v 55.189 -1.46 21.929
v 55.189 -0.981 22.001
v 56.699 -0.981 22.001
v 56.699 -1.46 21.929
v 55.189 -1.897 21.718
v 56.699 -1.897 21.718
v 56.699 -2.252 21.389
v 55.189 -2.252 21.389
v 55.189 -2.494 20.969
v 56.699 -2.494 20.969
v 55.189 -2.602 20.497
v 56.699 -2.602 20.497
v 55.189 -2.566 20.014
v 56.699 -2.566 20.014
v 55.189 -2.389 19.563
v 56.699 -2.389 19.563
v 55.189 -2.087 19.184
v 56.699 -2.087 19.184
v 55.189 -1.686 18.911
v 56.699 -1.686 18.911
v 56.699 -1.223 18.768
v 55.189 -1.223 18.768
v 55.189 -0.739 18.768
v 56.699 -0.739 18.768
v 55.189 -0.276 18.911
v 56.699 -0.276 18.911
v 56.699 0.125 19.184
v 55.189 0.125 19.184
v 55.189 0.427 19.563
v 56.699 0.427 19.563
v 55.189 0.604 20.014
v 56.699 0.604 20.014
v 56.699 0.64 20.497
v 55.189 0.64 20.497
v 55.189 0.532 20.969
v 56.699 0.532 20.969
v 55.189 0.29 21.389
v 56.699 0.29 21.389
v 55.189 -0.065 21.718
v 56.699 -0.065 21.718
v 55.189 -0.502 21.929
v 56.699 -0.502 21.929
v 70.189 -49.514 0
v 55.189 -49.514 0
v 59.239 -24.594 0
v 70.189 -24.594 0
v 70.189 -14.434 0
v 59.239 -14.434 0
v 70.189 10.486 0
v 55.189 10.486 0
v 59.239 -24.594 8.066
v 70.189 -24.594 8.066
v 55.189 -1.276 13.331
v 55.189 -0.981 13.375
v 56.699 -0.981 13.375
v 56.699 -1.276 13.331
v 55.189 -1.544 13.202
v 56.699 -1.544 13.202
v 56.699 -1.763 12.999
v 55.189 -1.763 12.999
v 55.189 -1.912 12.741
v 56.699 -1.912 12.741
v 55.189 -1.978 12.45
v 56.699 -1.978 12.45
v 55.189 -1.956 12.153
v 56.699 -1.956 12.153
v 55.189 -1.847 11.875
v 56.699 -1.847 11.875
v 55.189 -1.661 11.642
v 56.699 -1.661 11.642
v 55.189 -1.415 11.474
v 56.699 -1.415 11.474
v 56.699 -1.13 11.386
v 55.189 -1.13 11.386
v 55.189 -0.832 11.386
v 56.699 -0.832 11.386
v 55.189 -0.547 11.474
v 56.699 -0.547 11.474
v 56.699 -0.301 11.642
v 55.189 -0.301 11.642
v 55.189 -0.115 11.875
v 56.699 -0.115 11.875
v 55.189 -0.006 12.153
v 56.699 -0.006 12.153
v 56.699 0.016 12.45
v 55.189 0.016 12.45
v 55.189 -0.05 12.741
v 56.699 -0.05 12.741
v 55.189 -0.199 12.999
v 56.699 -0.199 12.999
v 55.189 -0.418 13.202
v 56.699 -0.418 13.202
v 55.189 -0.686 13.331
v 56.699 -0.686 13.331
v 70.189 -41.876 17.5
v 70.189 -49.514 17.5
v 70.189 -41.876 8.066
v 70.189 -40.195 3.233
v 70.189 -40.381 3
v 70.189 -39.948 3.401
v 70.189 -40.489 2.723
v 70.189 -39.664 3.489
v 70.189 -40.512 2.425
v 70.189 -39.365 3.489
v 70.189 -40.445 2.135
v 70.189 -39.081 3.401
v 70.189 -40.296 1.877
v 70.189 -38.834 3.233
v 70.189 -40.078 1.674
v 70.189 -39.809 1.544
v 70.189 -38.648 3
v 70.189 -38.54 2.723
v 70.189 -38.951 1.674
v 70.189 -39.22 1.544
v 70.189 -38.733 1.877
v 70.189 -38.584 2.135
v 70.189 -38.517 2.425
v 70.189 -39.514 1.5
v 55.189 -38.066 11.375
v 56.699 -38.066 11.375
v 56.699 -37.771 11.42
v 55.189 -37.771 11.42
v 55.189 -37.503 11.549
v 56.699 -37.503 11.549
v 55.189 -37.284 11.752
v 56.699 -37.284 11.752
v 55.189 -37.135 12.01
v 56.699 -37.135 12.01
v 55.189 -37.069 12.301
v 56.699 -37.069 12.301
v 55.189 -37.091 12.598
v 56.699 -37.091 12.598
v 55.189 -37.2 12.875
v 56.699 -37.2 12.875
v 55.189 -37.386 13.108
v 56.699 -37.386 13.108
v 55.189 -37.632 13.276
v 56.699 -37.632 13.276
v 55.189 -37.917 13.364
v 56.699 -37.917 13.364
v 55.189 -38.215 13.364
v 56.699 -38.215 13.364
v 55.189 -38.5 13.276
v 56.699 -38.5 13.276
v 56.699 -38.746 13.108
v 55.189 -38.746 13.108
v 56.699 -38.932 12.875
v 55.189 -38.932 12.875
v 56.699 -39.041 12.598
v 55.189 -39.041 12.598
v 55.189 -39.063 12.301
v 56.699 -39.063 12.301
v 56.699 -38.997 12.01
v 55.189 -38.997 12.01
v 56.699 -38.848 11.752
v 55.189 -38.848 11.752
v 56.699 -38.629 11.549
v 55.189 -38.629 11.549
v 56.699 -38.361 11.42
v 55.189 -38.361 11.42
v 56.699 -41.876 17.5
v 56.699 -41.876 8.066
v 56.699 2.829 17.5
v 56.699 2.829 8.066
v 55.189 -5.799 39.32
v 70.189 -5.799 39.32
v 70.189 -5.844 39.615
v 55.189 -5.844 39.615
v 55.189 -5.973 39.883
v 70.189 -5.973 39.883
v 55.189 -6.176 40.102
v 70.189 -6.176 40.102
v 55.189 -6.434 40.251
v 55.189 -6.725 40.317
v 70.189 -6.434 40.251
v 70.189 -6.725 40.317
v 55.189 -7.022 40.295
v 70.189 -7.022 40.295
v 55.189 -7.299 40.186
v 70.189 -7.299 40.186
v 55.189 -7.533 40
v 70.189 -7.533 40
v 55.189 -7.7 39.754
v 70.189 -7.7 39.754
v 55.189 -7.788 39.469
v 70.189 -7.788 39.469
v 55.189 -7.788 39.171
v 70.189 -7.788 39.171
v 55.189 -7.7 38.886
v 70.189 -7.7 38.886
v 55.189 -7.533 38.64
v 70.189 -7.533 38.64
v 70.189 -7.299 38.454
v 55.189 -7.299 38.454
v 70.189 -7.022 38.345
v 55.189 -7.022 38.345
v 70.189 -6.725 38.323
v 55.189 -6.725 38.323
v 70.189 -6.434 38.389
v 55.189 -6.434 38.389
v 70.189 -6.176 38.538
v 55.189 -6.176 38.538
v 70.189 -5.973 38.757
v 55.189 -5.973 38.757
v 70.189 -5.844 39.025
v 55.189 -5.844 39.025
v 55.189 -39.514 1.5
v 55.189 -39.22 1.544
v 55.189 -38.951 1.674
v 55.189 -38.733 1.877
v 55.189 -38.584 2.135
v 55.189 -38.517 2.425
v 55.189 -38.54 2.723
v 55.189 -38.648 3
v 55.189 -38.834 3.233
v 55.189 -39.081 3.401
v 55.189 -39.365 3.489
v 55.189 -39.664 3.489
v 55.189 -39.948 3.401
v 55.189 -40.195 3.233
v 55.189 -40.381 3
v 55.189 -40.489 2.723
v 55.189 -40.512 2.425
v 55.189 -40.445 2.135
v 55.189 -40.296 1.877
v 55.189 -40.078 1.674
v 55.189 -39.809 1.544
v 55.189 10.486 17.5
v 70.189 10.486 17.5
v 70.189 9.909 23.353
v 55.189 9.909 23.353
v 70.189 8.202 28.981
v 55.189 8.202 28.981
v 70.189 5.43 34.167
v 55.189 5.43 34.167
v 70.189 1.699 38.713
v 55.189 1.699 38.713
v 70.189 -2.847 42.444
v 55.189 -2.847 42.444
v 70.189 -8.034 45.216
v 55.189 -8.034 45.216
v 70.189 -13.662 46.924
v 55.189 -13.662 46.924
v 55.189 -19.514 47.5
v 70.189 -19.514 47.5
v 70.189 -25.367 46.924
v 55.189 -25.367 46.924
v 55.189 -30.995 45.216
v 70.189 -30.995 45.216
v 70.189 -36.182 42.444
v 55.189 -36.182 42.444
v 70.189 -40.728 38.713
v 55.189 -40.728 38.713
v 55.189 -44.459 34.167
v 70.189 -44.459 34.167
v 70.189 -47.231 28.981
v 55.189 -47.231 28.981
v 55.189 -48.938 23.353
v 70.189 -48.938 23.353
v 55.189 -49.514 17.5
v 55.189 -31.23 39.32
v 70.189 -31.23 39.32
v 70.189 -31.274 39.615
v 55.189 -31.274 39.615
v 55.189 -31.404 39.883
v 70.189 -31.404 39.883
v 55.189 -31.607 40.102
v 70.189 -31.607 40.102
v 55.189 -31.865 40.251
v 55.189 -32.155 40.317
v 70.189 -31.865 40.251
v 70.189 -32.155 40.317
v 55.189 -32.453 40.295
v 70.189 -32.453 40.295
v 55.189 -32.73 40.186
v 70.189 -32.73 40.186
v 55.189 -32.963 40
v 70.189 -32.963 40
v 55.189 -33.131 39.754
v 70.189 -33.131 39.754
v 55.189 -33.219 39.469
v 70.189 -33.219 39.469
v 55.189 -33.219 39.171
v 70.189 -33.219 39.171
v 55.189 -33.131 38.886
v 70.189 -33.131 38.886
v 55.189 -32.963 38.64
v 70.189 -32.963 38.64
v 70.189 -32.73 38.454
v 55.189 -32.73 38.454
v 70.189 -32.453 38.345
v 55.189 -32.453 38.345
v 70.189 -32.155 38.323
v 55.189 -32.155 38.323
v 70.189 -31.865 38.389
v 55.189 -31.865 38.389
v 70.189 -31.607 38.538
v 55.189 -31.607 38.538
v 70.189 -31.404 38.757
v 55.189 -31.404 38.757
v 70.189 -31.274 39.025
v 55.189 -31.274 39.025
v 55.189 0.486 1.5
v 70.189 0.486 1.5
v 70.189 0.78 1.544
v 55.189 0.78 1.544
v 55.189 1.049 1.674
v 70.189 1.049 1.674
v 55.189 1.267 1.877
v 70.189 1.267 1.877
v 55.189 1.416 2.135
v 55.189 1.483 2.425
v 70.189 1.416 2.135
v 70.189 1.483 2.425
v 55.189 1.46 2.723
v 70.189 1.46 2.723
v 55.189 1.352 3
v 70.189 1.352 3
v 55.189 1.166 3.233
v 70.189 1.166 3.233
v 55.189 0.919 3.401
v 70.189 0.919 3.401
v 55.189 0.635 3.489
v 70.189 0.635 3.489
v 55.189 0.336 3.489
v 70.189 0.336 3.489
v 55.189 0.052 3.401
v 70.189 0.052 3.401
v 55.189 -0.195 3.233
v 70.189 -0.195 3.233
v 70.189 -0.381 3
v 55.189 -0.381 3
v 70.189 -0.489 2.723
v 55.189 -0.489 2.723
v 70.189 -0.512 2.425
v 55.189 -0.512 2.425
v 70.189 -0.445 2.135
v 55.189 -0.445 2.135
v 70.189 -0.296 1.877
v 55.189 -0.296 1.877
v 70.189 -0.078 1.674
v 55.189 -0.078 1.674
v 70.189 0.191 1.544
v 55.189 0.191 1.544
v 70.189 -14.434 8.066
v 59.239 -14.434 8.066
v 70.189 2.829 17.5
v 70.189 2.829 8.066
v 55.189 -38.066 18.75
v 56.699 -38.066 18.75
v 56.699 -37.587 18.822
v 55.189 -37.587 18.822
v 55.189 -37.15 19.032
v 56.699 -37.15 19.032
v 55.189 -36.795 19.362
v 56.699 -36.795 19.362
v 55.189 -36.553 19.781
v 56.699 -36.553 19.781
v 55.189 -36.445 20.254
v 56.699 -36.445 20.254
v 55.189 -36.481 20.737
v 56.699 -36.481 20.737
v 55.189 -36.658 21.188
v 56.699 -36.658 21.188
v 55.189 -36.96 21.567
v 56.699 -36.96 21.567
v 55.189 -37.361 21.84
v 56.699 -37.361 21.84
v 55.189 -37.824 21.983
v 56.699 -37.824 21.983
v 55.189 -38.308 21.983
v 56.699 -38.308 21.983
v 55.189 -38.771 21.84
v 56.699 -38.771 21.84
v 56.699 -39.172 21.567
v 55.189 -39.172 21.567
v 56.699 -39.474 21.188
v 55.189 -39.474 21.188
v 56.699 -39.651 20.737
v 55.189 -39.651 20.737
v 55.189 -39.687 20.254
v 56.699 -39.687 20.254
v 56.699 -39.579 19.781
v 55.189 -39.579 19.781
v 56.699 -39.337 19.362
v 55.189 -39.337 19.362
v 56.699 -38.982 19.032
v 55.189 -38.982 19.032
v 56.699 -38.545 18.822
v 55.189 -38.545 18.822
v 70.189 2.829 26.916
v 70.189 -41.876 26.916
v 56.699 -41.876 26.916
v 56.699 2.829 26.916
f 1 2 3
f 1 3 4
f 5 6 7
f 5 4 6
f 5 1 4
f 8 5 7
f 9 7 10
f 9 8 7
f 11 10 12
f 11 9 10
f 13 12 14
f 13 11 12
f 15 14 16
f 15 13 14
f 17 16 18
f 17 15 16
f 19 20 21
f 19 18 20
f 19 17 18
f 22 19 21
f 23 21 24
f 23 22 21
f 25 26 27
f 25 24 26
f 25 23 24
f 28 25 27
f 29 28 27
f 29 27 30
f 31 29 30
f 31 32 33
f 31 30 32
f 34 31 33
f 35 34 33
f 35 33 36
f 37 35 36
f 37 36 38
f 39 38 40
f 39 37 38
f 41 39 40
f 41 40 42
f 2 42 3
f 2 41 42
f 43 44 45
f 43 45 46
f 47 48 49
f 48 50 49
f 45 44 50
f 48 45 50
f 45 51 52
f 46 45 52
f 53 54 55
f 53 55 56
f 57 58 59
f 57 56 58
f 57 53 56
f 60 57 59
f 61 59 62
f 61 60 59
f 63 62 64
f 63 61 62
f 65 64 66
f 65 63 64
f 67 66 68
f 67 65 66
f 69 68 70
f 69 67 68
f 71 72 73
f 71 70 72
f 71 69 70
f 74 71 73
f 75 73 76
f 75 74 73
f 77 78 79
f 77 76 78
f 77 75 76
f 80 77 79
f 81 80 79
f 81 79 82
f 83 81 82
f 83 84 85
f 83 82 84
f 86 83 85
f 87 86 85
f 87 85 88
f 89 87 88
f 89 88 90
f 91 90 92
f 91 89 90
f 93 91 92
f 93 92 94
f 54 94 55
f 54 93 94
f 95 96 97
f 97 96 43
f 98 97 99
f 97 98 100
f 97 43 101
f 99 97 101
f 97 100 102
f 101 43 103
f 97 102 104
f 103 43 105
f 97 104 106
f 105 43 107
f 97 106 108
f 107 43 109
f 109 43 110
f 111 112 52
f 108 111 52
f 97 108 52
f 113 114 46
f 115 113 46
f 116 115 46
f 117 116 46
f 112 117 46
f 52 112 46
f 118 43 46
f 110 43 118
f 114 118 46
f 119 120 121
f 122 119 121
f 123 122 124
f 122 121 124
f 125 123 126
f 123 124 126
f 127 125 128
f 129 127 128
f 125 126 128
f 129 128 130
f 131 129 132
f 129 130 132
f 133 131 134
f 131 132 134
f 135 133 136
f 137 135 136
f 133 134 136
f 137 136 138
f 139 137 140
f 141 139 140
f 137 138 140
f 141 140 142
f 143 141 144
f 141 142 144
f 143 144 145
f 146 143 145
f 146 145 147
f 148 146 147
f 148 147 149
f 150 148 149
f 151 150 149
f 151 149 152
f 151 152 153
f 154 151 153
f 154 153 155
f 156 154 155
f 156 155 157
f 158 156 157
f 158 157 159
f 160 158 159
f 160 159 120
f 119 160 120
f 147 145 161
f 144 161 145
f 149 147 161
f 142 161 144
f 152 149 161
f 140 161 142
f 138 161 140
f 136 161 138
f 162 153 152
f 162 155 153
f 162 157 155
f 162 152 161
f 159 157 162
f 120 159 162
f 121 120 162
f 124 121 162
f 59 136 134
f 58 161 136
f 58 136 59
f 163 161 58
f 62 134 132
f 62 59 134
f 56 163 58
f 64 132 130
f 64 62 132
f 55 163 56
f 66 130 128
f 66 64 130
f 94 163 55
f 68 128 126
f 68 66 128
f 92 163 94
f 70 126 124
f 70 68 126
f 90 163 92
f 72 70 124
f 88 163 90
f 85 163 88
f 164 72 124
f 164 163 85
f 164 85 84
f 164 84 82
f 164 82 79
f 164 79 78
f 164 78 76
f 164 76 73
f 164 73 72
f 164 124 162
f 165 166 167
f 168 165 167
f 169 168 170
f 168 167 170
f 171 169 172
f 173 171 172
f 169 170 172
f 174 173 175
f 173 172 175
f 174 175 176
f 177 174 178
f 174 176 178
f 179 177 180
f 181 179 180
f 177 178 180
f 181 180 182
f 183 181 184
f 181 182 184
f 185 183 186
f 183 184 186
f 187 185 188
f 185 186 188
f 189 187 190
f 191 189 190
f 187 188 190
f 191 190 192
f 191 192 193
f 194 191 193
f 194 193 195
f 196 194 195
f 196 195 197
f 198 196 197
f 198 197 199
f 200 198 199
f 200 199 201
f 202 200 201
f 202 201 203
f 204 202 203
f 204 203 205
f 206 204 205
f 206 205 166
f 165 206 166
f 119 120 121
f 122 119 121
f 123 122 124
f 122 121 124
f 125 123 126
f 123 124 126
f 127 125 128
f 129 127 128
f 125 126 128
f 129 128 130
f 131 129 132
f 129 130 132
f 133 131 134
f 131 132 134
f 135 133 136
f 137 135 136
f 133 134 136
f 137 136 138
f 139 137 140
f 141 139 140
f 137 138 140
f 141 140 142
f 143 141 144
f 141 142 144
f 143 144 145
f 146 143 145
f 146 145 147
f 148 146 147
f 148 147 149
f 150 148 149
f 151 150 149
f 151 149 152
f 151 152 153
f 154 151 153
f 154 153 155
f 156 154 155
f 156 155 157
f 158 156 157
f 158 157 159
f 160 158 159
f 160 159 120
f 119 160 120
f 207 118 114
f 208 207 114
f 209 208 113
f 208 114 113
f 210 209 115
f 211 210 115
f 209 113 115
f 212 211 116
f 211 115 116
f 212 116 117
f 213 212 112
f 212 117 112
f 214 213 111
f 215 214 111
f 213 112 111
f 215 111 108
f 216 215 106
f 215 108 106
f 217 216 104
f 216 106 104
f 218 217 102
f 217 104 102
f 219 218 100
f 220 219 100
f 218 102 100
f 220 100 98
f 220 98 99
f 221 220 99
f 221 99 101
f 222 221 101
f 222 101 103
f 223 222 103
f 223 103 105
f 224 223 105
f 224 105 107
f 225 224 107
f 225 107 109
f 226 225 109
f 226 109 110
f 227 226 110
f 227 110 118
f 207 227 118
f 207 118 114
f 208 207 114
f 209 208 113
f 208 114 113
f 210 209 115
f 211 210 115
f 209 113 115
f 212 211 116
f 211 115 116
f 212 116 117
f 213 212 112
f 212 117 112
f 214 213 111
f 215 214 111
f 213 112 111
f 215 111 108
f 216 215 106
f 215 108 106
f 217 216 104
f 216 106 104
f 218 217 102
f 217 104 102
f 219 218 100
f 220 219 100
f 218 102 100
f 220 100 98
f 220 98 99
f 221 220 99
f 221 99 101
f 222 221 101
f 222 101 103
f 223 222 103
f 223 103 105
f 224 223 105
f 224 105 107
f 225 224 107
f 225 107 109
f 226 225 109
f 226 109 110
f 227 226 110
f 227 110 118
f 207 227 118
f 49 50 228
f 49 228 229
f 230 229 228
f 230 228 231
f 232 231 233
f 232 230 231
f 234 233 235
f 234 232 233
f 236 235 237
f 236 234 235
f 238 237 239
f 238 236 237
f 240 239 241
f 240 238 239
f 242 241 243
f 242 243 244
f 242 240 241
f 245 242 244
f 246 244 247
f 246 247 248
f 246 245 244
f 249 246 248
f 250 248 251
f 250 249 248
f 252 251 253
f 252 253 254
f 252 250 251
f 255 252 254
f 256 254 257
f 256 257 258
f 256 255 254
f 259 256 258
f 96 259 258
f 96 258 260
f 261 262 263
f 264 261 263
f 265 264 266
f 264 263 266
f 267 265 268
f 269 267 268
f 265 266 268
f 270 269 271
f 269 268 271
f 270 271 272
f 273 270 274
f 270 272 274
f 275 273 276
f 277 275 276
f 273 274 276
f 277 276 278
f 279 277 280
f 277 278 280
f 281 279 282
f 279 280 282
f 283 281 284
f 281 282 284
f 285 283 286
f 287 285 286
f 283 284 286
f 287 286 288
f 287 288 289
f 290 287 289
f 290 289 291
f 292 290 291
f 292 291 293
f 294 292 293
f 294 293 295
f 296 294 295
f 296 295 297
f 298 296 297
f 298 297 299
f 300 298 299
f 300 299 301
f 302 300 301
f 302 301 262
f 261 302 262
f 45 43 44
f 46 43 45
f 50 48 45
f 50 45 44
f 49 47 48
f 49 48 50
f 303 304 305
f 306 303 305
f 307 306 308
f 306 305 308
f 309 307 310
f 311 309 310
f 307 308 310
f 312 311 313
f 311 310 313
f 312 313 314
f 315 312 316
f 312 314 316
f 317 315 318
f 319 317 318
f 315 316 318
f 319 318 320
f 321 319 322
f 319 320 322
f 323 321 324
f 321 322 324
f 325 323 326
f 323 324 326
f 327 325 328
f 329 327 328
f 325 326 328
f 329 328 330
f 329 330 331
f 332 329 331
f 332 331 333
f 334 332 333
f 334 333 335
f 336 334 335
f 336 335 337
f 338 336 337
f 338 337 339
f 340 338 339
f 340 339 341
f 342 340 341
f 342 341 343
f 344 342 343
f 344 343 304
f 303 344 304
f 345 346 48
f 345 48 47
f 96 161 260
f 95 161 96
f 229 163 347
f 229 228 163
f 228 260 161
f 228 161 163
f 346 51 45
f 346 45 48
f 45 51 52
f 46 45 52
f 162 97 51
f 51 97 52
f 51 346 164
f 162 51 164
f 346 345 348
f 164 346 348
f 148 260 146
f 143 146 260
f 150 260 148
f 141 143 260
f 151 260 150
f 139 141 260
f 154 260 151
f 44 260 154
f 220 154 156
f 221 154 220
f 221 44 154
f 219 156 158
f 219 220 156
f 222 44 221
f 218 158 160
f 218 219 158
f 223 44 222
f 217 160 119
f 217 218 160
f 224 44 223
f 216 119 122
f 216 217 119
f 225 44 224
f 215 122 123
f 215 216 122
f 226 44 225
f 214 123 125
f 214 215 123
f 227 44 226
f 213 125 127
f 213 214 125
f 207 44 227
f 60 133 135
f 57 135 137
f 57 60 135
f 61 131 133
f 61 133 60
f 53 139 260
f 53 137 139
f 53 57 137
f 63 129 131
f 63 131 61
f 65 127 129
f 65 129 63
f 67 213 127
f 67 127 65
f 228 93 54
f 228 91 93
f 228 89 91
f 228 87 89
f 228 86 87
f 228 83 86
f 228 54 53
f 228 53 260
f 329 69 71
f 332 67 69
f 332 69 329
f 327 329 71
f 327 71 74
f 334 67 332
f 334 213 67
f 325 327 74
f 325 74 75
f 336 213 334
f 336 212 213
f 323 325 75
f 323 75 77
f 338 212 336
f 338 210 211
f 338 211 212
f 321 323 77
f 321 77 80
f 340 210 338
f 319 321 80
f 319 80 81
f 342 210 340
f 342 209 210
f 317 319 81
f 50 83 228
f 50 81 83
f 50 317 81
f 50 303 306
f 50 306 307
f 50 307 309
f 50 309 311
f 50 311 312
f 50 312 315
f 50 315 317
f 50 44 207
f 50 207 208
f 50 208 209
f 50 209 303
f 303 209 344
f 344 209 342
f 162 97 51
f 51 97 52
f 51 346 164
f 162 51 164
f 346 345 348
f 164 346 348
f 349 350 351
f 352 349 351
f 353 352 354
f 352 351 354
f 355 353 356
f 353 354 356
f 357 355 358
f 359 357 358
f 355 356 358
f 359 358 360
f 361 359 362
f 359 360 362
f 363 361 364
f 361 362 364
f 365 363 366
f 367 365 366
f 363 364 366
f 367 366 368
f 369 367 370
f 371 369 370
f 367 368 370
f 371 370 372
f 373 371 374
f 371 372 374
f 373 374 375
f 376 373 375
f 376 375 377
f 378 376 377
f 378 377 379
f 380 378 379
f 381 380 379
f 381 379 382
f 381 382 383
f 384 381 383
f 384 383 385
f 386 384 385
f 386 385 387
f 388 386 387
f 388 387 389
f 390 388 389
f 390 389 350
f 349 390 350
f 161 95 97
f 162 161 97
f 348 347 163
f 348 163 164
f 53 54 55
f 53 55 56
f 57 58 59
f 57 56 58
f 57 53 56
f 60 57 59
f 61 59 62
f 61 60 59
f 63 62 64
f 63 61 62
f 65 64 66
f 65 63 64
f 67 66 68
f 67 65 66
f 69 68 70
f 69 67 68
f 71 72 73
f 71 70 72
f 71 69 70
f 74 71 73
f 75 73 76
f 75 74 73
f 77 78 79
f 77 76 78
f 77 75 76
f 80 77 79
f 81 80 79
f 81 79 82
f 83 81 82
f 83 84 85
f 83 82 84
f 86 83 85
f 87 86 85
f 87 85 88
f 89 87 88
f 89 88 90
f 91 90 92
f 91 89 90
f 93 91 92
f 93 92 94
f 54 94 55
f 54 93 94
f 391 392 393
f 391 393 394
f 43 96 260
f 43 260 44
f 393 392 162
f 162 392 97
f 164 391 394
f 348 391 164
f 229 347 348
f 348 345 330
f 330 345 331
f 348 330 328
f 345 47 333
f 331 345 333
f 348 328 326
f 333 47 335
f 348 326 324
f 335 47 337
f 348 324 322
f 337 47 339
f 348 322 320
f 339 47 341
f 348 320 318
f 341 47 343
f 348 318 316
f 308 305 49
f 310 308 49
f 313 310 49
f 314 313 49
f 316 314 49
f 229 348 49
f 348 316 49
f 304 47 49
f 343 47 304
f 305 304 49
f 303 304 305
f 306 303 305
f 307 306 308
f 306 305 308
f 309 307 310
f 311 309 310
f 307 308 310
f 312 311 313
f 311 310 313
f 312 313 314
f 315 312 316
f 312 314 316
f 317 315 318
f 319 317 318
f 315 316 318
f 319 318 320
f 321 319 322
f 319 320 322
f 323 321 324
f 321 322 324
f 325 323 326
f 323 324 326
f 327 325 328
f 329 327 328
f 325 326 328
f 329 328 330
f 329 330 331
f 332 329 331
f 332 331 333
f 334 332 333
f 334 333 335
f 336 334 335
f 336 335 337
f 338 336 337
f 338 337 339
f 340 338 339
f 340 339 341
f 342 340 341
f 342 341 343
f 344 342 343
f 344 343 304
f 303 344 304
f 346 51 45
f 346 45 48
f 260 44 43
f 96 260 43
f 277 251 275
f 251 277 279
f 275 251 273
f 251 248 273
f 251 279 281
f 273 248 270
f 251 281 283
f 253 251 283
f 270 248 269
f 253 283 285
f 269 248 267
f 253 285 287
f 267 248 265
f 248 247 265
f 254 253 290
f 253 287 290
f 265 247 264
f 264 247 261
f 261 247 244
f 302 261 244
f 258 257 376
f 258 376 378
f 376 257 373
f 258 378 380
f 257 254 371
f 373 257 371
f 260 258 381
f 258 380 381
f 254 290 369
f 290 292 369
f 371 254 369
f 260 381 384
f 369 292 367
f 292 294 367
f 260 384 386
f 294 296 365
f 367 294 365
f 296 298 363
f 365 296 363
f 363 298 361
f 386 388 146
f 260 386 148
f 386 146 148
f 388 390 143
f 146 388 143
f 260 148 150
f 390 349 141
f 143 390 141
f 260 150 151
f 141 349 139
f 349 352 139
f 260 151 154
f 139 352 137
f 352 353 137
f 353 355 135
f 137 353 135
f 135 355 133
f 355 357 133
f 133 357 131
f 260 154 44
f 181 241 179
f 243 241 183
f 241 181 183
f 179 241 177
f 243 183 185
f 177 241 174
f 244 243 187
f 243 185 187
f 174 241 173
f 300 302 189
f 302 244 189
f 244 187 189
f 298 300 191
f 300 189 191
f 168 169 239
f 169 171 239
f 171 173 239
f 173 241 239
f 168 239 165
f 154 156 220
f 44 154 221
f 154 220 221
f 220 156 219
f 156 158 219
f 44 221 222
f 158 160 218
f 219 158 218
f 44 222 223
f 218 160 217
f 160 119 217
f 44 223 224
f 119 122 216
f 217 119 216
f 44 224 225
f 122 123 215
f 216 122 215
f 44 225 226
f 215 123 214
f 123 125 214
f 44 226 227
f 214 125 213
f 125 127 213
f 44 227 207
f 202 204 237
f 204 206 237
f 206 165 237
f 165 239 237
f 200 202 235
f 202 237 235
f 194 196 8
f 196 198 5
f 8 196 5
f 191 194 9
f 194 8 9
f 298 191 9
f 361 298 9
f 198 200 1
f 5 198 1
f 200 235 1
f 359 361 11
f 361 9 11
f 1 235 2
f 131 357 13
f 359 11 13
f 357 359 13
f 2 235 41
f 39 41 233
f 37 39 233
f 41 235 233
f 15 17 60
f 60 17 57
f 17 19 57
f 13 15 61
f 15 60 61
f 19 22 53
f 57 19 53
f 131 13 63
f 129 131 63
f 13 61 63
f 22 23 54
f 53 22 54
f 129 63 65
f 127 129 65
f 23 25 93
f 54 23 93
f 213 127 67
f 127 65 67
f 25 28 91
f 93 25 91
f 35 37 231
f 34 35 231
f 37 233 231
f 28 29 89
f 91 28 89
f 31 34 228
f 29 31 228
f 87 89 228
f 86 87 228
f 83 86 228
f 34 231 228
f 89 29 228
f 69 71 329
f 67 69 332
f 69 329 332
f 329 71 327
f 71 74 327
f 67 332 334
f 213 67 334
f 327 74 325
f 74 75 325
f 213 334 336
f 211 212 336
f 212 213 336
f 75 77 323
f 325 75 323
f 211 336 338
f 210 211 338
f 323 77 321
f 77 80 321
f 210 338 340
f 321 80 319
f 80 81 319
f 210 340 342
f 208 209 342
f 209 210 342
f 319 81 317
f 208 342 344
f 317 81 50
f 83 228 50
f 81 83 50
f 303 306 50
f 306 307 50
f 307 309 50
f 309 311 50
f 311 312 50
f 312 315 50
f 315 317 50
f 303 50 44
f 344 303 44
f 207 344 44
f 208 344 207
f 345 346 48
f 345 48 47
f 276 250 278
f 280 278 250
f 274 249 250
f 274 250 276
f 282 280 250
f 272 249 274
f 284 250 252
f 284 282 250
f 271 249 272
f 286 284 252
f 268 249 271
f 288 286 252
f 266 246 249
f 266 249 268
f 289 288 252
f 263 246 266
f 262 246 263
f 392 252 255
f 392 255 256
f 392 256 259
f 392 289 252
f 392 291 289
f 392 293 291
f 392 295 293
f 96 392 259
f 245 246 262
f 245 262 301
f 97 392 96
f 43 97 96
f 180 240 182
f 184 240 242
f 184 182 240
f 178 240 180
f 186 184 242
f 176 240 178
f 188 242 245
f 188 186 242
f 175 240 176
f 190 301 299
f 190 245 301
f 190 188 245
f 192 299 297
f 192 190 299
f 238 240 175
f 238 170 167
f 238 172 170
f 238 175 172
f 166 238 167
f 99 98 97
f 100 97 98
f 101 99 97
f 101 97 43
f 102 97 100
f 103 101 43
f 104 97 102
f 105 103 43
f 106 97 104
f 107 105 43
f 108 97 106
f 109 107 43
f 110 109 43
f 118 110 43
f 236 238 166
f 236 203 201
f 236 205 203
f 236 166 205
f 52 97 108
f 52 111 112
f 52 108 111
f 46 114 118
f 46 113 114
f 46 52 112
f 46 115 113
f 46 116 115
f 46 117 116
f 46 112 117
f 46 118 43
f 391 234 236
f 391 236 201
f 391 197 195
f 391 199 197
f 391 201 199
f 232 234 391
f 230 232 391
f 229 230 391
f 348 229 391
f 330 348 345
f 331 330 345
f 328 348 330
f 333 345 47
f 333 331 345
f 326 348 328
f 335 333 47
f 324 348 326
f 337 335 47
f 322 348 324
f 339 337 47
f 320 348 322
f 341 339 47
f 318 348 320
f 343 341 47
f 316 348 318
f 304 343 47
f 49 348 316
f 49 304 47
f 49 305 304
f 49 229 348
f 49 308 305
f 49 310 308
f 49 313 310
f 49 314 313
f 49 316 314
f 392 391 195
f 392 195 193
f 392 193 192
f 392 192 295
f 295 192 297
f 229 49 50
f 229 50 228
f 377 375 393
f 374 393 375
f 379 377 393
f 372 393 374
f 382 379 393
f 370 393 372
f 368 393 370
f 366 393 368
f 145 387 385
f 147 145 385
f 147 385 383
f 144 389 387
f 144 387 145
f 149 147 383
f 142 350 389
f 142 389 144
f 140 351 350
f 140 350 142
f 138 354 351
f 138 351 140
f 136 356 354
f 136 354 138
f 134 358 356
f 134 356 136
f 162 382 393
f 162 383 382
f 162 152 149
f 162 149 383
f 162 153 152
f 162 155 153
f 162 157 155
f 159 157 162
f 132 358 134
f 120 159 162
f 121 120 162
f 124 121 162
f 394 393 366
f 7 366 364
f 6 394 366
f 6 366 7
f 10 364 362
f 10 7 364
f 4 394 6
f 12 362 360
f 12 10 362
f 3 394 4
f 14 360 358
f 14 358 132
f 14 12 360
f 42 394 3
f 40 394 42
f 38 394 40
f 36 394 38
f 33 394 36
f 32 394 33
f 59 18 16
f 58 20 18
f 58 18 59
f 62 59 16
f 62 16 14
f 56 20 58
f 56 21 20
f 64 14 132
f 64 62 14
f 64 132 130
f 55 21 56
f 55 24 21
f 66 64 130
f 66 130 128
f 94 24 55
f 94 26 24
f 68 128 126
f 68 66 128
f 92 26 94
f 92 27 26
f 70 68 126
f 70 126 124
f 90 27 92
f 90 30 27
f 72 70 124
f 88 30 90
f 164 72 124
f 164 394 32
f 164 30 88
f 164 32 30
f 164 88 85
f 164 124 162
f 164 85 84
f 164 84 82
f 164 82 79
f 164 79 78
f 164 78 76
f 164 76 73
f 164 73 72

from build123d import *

# Parameters (mm, degrees)
RESSALTO_EXTRUS_O9_DEPTH      = 12.5
RESSALTO_EXTRUS_O9_DEPTH_BACK = 5
ESBO_O34_W                    = 15
ESBO_O34_H                    = 60
RESSALTO_EXTRUS_O10_DEPTH     = 15
ESBO_O36_R                    = 1
CORTE_EXTRUS_O18_DEPTH        = 20
ESBO_O39_W                    = 18.85
ESBO_O39_H                    = 44.705
CORTE_EXTRUS_O20_DEPTH        = 13.49
ESBO_O43_W                    = 10.95
ESBO_O43_H                    = 10.16
CORTE_EXTRUS_O23_DEPTH        = 10
CORTE_EXTRUS_O33_DEPTH        = 20
CORTE_EXTRUS_O33_DEPTH_BACK   = 10
ESBO_O41_R                    = 1.6255
ESBO_O41_R_2                  = 1
ESBO_O42_R                    = 1.6255
ESBO_O42_R_2                  = 1
CORTE_EXTRUS_O34_DEPTH        = 20
ESBO_O62_R                    = 1
CORTE_EXTRUS_O35_DEPTH        = 20


with BuildPart() as part:
    # Esboço34 → Ressalto-extrusão9 (new, two sides: drawn at the far end of the back side and taken through both)
    with BuildSketch(Plane.XY.offset(5).offset(-RESSALTO_EXTRUS_O9_DEPTH_BACK)):
        with Locations((62.689074272, -19.514497041)):
            Rectangle(ESBO_O34_W, ESBO_O34_H)
    extrude(amount=RESSALTO_EXTRUS_O9_DEPTH + RESSALTO_EXTRUS_O9_DEPTH_BACK)


with BuildPart() as body_2:
    # Esboço35 → Ressalto-extrusão10 (new body)
    with BuildSketch(Plane(origin=(70.189074272, 0, 0), x_dir=(0, 0, -1), z_dir=(1, 0, 0))):
        with BuildLine():
            Line((0, 10.485502959), (-17.5, 10.485502959))
            ThreePointArc((-17.5, 10.485502959), (-47.5, -19.514497041), (-17.5, -49.514497041))
            Line((-17.5, -49.514497041), (0, -49.514497041))
            Line((0, -49.514497041), (0, 10.485502959))
        make_face()
    extrude(amount=-RESSALTO_EXTRUS_O10_DEPTH)


with BuildPart() as corte_extrus_o18_tool:
    # Esboço36 → Corte-extrusão18 (new body)
    with BuildSketch(Plane(origin=(70.189074272, 0, 0), x_dir=(0, 0, -1), z_dir=(1, 0, 0))):
        with Locations((-2.5, -39.514497041)):
            Circle(ESBO_O36_R)
        with Locations((-2.5, 0.485502959)):
            Circle(ESBO_O36_R)
    extrude(amount=-CORTE_EXTRUS_O18_DEPTH)


with BuildPart() as part_1:
    add(part.part)

    # Corte-extrusão18: cut by corte_extrus_o18_tool
    add(corte_extrus_o18_tool.part, mode=Mode.SUBTRACT)


with BuildPart() as body_2_1:
    add(body_2.part)

    # Corte-extrusão18: cut by corte_extrus_o18_tool
    add(corte_extrus_o18_tool.part, mode=Mode.SUBTRACT)


with BuildPart() as corte_extrus_o20_tool:
    # Esboço39 → Corte-extrusão20 (new body)
    with BuildSketch(Plane(origin=(70.189074272, 0, 0), x_dir=(0, 0, -1), z_dir=(1, 0, 0))):
        with Locations((-17.491326567, -19.523544175)):
            Rectangle(ESBO_O39_W, ESBO_O39_H)
    extrude(amount=-CORTE_EXTRUS_O20_DEPTH)


with BuildPart() as part_2:
    add(part_1.part)

    # Corte-extrusão20: cut by corte_extrus_o20_tool
    add(corte_extrus_o20_tool.part, mode=Mode.SUBTRACT)


with BuildPart() as body_2_2:
    add(body_2_1.part)

    # Corte-extrusão20: cut by corte_extrus_o20_tool
    add(corte_extrus_o20_tool.part, mode=Mode.SUBTRACT)


with BuildPart() as corte_extrus_o23_tool:
    # Esboço43 → Corte-extrusão23 (new body)
    with BuildSketch(Plane.XY.offset(8.066326567)):
        with Locations((64.714074272, -19.514497041)):
            Rectangle(ESBO_O43_W, ESBO_O43_H)
    extrude(amount=-CORTE_EXTRUS_O23_DEPTH)


with BuildPart() as part_3:
    add(part_2.part)

    # Corte-extrusão23: cut by corte_extrus_o23_tool
    add(corte_extrus_o23_tool.part, mode=Mode.SUBTRACT)


with BuildPart() as body_2_3:
    add(body_2_2.part)

    # Corte-extrusão23: cut by corte_extrus_o23_tool
    add(corte_extrus_o23_tool.part, mode=Mode.SUBTRACT)


with BuildPart() as corte_extrus_o33_tool:
    # Esboço41 → Corte-extrusão33 (new, two sides: drawn at the far end of the back side and taken through both)
    with BuildSketch(Plane(origin=(56.699074272, 0, 0), x_dir=(0, 0, -1), z_dir=(1, 0, 0)).offset(-CORTE_EXTRUS_O33_DEPTH_BACK)):
        with Locations(Location((-20.375326567, -0.981044175, 0), (0, 0, 180))):
            Circle(ESBO_O41_R)
        with Locations(Location((-12.375326567, -0.981044175, 0), (0, 0, 180))):
            Circle(ESBO_O41_R_2)
    extrude(amount=CORTE_EXTRUS_O33_DEPTH + CORTE_EXTRUS_O33_DEPTH_BACK)


with BuildPart() as part_4:
    add(part_3.part)

    # Corte-extrusão33: cut by corte_extrus_o33_tool
    add(corte_extrus_o33_tool.part, mode=Mode.SUBTRACT)


with BuildPart() as body_2_4:
    add(body_2_3.part)

    # Corte-extrusão33: cut by corte_extrus_o33_tool
    add(corte_extrus_o33_tool.part, mode=Mode.SUBTRACT)


with BuildPart() as corte_extrus_o34_tool:
    # Esboço42 → Corte-extrusão34 (new body)
    with BuildSketch(Plane(origin=(56.699074272, 0, 0), x_dir=(0, 0, -1), z_dir=(1, 0, 0))):
        with Locations((-20.375326567, -38.066044175)):
            Circle(ESBO_O42_R)
        with Locations((-12.375326567, -38.066044175)):
            Circle(ESBO_O42_R_2)
    extrude(amount=-CORTE_EXTRUS_O34_DEPTH)


with BuildPart() as part_5:
    add(part_4.part)

    # Corte-extrusão34: cut by corte_extrus_o34_tool
    add(corte_extrus_o34_tool.part, mode=Mode.SUBTRACT)


with BuildPart() as body_2_5:
    add(body_2_4.part)

    # Corte-extrusão34: cut by corte_extrus_o34_tool
    add(corte_extrus_o34_tool.part, mode=Mode.SUBTRACT)

    # Esboço62 → Corte-extrusão35 (cut)
    with BuildSketch(Plane(origin=(70.189074272, 0, 0), x_dir=(0, 0, -1), z_dir=(1, 0, 0))):
        with Locations(Location((-39.32, -32.229996518, 0), (0, 0, 90))):
            Circle(ESBO_O62_R)
        with Locations(Location((-39.32, -6.799454191, 0), (0, 0, 90))):
            Circle(ESBO_O62_R)
    extrude(amount=-CORTE_EXTRUS_O35_DEPTH, mode=Mode.SUBTRACT)


solid = Compound([part_5.part, body_2_5.part])
